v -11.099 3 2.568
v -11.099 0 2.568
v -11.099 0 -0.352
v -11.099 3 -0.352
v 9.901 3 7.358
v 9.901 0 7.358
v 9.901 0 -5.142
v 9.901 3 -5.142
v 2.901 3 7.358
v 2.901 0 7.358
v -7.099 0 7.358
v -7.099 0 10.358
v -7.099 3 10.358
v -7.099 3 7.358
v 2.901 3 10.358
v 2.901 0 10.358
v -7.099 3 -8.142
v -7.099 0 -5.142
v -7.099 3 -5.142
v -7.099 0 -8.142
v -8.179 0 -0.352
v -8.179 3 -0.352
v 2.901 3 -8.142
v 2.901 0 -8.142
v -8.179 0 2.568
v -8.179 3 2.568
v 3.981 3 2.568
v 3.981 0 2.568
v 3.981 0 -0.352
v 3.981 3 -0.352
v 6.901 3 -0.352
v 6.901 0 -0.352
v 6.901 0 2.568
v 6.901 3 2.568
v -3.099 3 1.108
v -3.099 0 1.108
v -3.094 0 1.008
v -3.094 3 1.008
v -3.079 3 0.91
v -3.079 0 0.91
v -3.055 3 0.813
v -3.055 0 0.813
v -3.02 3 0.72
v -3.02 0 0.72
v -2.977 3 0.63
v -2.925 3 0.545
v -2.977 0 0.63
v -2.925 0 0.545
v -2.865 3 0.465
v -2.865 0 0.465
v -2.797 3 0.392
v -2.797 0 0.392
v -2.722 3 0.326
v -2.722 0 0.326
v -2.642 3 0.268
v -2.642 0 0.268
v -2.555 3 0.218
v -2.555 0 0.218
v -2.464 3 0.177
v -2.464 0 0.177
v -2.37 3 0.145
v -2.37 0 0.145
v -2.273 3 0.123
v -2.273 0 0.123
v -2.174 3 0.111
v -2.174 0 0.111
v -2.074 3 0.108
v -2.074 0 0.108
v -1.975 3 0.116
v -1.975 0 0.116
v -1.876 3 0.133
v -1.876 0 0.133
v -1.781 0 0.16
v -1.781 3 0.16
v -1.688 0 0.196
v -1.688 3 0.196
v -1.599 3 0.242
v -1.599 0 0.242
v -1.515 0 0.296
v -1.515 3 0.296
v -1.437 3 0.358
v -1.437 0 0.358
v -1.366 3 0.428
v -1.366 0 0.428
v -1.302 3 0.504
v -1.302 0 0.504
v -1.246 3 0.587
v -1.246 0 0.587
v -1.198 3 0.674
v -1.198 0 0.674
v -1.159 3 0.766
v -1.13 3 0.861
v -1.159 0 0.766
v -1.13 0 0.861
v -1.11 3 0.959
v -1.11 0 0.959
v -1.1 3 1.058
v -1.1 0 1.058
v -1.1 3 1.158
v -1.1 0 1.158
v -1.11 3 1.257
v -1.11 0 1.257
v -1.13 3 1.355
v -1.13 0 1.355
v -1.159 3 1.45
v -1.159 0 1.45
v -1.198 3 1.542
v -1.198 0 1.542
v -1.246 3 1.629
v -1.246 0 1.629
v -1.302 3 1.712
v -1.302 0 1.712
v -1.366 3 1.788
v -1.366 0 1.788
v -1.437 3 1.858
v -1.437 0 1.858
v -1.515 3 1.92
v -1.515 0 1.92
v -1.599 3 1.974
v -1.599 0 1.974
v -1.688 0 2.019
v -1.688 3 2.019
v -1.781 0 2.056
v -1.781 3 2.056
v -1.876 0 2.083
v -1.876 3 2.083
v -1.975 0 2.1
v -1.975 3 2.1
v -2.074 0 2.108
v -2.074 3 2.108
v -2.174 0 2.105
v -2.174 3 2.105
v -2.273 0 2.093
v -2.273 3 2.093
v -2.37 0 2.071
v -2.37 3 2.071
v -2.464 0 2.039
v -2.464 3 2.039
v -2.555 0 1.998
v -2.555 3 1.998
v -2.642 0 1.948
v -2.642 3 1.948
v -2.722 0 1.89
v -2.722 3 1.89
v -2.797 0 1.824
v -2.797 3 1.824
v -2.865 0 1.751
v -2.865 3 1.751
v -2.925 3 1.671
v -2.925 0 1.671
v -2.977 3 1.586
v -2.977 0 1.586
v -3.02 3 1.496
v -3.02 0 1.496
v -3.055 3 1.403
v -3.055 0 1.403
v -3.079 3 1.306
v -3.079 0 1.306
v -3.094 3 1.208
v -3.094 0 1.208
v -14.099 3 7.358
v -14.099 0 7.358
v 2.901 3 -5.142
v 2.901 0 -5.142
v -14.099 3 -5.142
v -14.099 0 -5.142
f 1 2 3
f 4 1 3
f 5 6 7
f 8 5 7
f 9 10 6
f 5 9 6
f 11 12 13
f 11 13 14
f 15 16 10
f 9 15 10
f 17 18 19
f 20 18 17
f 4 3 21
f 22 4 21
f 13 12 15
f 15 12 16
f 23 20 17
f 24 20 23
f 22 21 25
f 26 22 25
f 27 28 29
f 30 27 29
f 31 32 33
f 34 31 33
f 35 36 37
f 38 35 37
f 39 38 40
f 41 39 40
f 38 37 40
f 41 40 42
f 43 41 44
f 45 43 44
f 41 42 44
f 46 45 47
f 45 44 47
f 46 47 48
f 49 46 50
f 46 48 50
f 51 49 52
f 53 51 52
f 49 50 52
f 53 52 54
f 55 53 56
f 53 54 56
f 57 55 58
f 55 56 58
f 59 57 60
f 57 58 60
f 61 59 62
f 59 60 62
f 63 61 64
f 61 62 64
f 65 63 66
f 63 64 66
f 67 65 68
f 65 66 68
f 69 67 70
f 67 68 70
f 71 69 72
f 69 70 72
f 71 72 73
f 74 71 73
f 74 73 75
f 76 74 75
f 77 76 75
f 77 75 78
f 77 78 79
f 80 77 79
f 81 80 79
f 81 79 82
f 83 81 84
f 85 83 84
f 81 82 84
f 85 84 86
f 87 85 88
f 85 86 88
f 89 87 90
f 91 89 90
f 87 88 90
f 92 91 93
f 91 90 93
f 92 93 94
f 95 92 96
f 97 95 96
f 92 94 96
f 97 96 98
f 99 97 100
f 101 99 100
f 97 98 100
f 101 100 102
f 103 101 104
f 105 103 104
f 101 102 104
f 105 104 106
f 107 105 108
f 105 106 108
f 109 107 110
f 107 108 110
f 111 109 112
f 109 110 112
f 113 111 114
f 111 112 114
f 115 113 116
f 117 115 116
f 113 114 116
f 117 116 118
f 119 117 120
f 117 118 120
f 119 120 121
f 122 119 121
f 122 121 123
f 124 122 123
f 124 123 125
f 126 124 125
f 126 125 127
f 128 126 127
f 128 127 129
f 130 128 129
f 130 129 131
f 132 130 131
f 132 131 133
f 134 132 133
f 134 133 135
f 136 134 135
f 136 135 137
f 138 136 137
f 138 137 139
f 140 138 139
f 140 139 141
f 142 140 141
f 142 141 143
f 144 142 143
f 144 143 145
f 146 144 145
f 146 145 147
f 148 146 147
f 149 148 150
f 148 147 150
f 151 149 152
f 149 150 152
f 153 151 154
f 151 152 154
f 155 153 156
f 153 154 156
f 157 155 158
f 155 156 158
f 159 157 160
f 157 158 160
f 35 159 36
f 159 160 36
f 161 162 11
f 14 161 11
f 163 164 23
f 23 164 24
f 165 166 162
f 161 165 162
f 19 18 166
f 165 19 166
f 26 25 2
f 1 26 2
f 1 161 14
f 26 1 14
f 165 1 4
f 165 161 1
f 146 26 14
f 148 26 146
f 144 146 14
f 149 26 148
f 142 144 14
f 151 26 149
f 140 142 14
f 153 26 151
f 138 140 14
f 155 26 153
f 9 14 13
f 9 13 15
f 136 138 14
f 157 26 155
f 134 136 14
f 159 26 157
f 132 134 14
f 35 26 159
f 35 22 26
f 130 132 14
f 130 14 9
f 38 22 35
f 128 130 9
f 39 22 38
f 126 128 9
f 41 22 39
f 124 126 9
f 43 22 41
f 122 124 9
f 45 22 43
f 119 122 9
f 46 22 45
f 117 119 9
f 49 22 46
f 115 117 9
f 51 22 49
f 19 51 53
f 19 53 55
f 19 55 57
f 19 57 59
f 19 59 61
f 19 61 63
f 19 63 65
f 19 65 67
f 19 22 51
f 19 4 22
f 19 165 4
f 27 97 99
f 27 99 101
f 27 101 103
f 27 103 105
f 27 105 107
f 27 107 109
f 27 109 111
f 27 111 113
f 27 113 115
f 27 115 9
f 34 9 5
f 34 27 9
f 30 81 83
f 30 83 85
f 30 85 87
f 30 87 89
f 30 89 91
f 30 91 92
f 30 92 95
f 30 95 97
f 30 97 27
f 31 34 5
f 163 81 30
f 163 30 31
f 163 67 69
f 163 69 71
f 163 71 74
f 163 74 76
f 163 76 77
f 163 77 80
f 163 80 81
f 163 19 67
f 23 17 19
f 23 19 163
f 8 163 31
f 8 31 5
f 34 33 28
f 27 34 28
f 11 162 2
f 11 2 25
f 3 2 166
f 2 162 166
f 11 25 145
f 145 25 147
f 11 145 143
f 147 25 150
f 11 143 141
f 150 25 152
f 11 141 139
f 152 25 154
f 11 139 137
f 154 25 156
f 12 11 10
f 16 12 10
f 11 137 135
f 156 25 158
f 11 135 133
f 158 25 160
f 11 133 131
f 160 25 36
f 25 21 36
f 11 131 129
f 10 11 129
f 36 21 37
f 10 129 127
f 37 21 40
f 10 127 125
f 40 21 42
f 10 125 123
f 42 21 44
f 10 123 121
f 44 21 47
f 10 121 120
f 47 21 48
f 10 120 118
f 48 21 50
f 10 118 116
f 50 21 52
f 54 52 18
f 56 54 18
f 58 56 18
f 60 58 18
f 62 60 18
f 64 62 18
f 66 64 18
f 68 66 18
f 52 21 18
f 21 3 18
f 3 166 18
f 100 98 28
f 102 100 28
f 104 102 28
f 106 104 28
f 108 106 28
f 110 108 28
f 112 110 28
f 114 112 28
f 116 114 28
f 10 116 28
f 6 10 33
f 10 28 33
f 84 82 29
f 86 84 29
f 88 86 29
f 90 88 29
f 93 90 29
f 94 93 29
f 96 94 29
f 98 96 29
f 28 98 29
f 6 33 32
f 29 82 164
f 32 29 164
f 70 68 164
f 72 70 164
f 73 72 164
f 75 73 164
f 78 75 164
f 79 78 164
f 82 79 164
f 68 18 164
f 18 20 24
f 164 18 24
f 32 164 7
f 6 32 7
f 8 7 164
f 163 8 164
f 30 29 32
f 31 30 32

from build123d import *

# Parameters (mm, degrees)
SKETCH1_W           = 10
SKETCH1_H           = 3
BOSS_EXTRUDE1_DEPTH = 3


with BuildPart() as part:
    # Sketch1 → Boss-Extrude1 (new body)
    with BuildSketch(Plane(origin=(0, 0, 0), x_dir=(1, 0, 0), z_dir=(0, 1, 0))):
        with BuildLine():
            Line((9.900990099, -7.357973937), (9.900990099, -1.107973937))
            Line((9.900990099, -1.107973937), (6.900990099, -1.107973937))
            Line((6.900990099, -1.107973937), (6.900990099, -2.567973937))
            Line((6.900990099, -2.567973937), (3.980990099, -2.567973937))
            Line((3.980990099, -2.567973937), (3.980990099, -1.107973937))
            Line((3.980990099, -1.107973937), (-1.099009901, -1.107973937))
            ThreePointArc((-1.099009901, -1.107973937), (-2.099009901, -2.107973937), (-3.099009901, -1.107973937))
            Line((-3.099009901, -1.107973937), (-8.179009901, -1.107973937))
            Line((-8.179009901, -1.107973937), (-8.179009901, -2.567973937))
            Line((-8.179009901, -2.567973937), (-11.099009901, -2.567973937))
            Line((-11.099009901, -2.567973937), (-11.099009901, -1.107973937))
            Line((-11.099009901, -1.107973937), (-14.099009901, -1.107973937))
            Line((-14.099009901, -1.107973937), (-14.099009901, -7.357973937))
            Line((-14.099009901, -7.357973937), (-7.099009901, -7.357973937))
            Line((-7.099009901, -7.357973937), (2.900990099, -7.357973937))
            Line((2.900990099, -7.357973937), (9.900990099, -7.357973937))
        make_face()
        with BuildLine():
            Line((9.900990099, 5.142026063), (2.900990099, 5.142026063))
            Line((2.900990099, 5.142026063), (-7.099009901, 5.142026063))
            Line((-7.099009901, 5.142026063), (-14.099009901, 5.142026063))
            Line((-14.099009901, 5.142026063), (-14.099009901, -1.107973937))
            Line((-14.099009901, -1.107973937), (-11.099009901, -1.107973937))
            Line((-11.099009901, -1.107973937), (-11.099009901, 0.352026063))
            Line((-11.099009901, 0.352026063), (-8.179009901, 0.352026063))
            Line((-8.179009901, 0.352026063), (-8.179009901, -1.107973937))
            Line((-8.179009901, -1.107973937), (-3.099009901, -1.107973937))
            ThreePointArc((-3.099009901, -1.107973937), (-2.099009901, -0.107973937), (-1.099009901, -1.107973937))
            Line((-1.099009901, -1.107973937), (3.980990099, -1.107973937))
            Line((3.980990099, -1.107973937), (3.980990099, 0.352026063))
            Line((3.980990099, 0.352026063), (6.900990099, 0.352026063))
            Line((6.900990099, 0.352026063), (6.900990099, -1.107973937))
            Line((6.900990099, -1.107973937), (9.900990099, -1.107973937))
            Line((9.900990099, -1.107973937), (9.900990099, 5.142026063))
        make_face()
        with Locations((-2.099009901, 6.642026063)):
            Rectangle(SKETCH1_W, SKETCH1_H)
        with Locations((-2.099009901, -8.857973937)):
            Rectangle(SKETCH1_W, SKETCH1_H)
    extrude(amount=BOSS_EXTRUDE1_DEPTH)


solid = part.part
